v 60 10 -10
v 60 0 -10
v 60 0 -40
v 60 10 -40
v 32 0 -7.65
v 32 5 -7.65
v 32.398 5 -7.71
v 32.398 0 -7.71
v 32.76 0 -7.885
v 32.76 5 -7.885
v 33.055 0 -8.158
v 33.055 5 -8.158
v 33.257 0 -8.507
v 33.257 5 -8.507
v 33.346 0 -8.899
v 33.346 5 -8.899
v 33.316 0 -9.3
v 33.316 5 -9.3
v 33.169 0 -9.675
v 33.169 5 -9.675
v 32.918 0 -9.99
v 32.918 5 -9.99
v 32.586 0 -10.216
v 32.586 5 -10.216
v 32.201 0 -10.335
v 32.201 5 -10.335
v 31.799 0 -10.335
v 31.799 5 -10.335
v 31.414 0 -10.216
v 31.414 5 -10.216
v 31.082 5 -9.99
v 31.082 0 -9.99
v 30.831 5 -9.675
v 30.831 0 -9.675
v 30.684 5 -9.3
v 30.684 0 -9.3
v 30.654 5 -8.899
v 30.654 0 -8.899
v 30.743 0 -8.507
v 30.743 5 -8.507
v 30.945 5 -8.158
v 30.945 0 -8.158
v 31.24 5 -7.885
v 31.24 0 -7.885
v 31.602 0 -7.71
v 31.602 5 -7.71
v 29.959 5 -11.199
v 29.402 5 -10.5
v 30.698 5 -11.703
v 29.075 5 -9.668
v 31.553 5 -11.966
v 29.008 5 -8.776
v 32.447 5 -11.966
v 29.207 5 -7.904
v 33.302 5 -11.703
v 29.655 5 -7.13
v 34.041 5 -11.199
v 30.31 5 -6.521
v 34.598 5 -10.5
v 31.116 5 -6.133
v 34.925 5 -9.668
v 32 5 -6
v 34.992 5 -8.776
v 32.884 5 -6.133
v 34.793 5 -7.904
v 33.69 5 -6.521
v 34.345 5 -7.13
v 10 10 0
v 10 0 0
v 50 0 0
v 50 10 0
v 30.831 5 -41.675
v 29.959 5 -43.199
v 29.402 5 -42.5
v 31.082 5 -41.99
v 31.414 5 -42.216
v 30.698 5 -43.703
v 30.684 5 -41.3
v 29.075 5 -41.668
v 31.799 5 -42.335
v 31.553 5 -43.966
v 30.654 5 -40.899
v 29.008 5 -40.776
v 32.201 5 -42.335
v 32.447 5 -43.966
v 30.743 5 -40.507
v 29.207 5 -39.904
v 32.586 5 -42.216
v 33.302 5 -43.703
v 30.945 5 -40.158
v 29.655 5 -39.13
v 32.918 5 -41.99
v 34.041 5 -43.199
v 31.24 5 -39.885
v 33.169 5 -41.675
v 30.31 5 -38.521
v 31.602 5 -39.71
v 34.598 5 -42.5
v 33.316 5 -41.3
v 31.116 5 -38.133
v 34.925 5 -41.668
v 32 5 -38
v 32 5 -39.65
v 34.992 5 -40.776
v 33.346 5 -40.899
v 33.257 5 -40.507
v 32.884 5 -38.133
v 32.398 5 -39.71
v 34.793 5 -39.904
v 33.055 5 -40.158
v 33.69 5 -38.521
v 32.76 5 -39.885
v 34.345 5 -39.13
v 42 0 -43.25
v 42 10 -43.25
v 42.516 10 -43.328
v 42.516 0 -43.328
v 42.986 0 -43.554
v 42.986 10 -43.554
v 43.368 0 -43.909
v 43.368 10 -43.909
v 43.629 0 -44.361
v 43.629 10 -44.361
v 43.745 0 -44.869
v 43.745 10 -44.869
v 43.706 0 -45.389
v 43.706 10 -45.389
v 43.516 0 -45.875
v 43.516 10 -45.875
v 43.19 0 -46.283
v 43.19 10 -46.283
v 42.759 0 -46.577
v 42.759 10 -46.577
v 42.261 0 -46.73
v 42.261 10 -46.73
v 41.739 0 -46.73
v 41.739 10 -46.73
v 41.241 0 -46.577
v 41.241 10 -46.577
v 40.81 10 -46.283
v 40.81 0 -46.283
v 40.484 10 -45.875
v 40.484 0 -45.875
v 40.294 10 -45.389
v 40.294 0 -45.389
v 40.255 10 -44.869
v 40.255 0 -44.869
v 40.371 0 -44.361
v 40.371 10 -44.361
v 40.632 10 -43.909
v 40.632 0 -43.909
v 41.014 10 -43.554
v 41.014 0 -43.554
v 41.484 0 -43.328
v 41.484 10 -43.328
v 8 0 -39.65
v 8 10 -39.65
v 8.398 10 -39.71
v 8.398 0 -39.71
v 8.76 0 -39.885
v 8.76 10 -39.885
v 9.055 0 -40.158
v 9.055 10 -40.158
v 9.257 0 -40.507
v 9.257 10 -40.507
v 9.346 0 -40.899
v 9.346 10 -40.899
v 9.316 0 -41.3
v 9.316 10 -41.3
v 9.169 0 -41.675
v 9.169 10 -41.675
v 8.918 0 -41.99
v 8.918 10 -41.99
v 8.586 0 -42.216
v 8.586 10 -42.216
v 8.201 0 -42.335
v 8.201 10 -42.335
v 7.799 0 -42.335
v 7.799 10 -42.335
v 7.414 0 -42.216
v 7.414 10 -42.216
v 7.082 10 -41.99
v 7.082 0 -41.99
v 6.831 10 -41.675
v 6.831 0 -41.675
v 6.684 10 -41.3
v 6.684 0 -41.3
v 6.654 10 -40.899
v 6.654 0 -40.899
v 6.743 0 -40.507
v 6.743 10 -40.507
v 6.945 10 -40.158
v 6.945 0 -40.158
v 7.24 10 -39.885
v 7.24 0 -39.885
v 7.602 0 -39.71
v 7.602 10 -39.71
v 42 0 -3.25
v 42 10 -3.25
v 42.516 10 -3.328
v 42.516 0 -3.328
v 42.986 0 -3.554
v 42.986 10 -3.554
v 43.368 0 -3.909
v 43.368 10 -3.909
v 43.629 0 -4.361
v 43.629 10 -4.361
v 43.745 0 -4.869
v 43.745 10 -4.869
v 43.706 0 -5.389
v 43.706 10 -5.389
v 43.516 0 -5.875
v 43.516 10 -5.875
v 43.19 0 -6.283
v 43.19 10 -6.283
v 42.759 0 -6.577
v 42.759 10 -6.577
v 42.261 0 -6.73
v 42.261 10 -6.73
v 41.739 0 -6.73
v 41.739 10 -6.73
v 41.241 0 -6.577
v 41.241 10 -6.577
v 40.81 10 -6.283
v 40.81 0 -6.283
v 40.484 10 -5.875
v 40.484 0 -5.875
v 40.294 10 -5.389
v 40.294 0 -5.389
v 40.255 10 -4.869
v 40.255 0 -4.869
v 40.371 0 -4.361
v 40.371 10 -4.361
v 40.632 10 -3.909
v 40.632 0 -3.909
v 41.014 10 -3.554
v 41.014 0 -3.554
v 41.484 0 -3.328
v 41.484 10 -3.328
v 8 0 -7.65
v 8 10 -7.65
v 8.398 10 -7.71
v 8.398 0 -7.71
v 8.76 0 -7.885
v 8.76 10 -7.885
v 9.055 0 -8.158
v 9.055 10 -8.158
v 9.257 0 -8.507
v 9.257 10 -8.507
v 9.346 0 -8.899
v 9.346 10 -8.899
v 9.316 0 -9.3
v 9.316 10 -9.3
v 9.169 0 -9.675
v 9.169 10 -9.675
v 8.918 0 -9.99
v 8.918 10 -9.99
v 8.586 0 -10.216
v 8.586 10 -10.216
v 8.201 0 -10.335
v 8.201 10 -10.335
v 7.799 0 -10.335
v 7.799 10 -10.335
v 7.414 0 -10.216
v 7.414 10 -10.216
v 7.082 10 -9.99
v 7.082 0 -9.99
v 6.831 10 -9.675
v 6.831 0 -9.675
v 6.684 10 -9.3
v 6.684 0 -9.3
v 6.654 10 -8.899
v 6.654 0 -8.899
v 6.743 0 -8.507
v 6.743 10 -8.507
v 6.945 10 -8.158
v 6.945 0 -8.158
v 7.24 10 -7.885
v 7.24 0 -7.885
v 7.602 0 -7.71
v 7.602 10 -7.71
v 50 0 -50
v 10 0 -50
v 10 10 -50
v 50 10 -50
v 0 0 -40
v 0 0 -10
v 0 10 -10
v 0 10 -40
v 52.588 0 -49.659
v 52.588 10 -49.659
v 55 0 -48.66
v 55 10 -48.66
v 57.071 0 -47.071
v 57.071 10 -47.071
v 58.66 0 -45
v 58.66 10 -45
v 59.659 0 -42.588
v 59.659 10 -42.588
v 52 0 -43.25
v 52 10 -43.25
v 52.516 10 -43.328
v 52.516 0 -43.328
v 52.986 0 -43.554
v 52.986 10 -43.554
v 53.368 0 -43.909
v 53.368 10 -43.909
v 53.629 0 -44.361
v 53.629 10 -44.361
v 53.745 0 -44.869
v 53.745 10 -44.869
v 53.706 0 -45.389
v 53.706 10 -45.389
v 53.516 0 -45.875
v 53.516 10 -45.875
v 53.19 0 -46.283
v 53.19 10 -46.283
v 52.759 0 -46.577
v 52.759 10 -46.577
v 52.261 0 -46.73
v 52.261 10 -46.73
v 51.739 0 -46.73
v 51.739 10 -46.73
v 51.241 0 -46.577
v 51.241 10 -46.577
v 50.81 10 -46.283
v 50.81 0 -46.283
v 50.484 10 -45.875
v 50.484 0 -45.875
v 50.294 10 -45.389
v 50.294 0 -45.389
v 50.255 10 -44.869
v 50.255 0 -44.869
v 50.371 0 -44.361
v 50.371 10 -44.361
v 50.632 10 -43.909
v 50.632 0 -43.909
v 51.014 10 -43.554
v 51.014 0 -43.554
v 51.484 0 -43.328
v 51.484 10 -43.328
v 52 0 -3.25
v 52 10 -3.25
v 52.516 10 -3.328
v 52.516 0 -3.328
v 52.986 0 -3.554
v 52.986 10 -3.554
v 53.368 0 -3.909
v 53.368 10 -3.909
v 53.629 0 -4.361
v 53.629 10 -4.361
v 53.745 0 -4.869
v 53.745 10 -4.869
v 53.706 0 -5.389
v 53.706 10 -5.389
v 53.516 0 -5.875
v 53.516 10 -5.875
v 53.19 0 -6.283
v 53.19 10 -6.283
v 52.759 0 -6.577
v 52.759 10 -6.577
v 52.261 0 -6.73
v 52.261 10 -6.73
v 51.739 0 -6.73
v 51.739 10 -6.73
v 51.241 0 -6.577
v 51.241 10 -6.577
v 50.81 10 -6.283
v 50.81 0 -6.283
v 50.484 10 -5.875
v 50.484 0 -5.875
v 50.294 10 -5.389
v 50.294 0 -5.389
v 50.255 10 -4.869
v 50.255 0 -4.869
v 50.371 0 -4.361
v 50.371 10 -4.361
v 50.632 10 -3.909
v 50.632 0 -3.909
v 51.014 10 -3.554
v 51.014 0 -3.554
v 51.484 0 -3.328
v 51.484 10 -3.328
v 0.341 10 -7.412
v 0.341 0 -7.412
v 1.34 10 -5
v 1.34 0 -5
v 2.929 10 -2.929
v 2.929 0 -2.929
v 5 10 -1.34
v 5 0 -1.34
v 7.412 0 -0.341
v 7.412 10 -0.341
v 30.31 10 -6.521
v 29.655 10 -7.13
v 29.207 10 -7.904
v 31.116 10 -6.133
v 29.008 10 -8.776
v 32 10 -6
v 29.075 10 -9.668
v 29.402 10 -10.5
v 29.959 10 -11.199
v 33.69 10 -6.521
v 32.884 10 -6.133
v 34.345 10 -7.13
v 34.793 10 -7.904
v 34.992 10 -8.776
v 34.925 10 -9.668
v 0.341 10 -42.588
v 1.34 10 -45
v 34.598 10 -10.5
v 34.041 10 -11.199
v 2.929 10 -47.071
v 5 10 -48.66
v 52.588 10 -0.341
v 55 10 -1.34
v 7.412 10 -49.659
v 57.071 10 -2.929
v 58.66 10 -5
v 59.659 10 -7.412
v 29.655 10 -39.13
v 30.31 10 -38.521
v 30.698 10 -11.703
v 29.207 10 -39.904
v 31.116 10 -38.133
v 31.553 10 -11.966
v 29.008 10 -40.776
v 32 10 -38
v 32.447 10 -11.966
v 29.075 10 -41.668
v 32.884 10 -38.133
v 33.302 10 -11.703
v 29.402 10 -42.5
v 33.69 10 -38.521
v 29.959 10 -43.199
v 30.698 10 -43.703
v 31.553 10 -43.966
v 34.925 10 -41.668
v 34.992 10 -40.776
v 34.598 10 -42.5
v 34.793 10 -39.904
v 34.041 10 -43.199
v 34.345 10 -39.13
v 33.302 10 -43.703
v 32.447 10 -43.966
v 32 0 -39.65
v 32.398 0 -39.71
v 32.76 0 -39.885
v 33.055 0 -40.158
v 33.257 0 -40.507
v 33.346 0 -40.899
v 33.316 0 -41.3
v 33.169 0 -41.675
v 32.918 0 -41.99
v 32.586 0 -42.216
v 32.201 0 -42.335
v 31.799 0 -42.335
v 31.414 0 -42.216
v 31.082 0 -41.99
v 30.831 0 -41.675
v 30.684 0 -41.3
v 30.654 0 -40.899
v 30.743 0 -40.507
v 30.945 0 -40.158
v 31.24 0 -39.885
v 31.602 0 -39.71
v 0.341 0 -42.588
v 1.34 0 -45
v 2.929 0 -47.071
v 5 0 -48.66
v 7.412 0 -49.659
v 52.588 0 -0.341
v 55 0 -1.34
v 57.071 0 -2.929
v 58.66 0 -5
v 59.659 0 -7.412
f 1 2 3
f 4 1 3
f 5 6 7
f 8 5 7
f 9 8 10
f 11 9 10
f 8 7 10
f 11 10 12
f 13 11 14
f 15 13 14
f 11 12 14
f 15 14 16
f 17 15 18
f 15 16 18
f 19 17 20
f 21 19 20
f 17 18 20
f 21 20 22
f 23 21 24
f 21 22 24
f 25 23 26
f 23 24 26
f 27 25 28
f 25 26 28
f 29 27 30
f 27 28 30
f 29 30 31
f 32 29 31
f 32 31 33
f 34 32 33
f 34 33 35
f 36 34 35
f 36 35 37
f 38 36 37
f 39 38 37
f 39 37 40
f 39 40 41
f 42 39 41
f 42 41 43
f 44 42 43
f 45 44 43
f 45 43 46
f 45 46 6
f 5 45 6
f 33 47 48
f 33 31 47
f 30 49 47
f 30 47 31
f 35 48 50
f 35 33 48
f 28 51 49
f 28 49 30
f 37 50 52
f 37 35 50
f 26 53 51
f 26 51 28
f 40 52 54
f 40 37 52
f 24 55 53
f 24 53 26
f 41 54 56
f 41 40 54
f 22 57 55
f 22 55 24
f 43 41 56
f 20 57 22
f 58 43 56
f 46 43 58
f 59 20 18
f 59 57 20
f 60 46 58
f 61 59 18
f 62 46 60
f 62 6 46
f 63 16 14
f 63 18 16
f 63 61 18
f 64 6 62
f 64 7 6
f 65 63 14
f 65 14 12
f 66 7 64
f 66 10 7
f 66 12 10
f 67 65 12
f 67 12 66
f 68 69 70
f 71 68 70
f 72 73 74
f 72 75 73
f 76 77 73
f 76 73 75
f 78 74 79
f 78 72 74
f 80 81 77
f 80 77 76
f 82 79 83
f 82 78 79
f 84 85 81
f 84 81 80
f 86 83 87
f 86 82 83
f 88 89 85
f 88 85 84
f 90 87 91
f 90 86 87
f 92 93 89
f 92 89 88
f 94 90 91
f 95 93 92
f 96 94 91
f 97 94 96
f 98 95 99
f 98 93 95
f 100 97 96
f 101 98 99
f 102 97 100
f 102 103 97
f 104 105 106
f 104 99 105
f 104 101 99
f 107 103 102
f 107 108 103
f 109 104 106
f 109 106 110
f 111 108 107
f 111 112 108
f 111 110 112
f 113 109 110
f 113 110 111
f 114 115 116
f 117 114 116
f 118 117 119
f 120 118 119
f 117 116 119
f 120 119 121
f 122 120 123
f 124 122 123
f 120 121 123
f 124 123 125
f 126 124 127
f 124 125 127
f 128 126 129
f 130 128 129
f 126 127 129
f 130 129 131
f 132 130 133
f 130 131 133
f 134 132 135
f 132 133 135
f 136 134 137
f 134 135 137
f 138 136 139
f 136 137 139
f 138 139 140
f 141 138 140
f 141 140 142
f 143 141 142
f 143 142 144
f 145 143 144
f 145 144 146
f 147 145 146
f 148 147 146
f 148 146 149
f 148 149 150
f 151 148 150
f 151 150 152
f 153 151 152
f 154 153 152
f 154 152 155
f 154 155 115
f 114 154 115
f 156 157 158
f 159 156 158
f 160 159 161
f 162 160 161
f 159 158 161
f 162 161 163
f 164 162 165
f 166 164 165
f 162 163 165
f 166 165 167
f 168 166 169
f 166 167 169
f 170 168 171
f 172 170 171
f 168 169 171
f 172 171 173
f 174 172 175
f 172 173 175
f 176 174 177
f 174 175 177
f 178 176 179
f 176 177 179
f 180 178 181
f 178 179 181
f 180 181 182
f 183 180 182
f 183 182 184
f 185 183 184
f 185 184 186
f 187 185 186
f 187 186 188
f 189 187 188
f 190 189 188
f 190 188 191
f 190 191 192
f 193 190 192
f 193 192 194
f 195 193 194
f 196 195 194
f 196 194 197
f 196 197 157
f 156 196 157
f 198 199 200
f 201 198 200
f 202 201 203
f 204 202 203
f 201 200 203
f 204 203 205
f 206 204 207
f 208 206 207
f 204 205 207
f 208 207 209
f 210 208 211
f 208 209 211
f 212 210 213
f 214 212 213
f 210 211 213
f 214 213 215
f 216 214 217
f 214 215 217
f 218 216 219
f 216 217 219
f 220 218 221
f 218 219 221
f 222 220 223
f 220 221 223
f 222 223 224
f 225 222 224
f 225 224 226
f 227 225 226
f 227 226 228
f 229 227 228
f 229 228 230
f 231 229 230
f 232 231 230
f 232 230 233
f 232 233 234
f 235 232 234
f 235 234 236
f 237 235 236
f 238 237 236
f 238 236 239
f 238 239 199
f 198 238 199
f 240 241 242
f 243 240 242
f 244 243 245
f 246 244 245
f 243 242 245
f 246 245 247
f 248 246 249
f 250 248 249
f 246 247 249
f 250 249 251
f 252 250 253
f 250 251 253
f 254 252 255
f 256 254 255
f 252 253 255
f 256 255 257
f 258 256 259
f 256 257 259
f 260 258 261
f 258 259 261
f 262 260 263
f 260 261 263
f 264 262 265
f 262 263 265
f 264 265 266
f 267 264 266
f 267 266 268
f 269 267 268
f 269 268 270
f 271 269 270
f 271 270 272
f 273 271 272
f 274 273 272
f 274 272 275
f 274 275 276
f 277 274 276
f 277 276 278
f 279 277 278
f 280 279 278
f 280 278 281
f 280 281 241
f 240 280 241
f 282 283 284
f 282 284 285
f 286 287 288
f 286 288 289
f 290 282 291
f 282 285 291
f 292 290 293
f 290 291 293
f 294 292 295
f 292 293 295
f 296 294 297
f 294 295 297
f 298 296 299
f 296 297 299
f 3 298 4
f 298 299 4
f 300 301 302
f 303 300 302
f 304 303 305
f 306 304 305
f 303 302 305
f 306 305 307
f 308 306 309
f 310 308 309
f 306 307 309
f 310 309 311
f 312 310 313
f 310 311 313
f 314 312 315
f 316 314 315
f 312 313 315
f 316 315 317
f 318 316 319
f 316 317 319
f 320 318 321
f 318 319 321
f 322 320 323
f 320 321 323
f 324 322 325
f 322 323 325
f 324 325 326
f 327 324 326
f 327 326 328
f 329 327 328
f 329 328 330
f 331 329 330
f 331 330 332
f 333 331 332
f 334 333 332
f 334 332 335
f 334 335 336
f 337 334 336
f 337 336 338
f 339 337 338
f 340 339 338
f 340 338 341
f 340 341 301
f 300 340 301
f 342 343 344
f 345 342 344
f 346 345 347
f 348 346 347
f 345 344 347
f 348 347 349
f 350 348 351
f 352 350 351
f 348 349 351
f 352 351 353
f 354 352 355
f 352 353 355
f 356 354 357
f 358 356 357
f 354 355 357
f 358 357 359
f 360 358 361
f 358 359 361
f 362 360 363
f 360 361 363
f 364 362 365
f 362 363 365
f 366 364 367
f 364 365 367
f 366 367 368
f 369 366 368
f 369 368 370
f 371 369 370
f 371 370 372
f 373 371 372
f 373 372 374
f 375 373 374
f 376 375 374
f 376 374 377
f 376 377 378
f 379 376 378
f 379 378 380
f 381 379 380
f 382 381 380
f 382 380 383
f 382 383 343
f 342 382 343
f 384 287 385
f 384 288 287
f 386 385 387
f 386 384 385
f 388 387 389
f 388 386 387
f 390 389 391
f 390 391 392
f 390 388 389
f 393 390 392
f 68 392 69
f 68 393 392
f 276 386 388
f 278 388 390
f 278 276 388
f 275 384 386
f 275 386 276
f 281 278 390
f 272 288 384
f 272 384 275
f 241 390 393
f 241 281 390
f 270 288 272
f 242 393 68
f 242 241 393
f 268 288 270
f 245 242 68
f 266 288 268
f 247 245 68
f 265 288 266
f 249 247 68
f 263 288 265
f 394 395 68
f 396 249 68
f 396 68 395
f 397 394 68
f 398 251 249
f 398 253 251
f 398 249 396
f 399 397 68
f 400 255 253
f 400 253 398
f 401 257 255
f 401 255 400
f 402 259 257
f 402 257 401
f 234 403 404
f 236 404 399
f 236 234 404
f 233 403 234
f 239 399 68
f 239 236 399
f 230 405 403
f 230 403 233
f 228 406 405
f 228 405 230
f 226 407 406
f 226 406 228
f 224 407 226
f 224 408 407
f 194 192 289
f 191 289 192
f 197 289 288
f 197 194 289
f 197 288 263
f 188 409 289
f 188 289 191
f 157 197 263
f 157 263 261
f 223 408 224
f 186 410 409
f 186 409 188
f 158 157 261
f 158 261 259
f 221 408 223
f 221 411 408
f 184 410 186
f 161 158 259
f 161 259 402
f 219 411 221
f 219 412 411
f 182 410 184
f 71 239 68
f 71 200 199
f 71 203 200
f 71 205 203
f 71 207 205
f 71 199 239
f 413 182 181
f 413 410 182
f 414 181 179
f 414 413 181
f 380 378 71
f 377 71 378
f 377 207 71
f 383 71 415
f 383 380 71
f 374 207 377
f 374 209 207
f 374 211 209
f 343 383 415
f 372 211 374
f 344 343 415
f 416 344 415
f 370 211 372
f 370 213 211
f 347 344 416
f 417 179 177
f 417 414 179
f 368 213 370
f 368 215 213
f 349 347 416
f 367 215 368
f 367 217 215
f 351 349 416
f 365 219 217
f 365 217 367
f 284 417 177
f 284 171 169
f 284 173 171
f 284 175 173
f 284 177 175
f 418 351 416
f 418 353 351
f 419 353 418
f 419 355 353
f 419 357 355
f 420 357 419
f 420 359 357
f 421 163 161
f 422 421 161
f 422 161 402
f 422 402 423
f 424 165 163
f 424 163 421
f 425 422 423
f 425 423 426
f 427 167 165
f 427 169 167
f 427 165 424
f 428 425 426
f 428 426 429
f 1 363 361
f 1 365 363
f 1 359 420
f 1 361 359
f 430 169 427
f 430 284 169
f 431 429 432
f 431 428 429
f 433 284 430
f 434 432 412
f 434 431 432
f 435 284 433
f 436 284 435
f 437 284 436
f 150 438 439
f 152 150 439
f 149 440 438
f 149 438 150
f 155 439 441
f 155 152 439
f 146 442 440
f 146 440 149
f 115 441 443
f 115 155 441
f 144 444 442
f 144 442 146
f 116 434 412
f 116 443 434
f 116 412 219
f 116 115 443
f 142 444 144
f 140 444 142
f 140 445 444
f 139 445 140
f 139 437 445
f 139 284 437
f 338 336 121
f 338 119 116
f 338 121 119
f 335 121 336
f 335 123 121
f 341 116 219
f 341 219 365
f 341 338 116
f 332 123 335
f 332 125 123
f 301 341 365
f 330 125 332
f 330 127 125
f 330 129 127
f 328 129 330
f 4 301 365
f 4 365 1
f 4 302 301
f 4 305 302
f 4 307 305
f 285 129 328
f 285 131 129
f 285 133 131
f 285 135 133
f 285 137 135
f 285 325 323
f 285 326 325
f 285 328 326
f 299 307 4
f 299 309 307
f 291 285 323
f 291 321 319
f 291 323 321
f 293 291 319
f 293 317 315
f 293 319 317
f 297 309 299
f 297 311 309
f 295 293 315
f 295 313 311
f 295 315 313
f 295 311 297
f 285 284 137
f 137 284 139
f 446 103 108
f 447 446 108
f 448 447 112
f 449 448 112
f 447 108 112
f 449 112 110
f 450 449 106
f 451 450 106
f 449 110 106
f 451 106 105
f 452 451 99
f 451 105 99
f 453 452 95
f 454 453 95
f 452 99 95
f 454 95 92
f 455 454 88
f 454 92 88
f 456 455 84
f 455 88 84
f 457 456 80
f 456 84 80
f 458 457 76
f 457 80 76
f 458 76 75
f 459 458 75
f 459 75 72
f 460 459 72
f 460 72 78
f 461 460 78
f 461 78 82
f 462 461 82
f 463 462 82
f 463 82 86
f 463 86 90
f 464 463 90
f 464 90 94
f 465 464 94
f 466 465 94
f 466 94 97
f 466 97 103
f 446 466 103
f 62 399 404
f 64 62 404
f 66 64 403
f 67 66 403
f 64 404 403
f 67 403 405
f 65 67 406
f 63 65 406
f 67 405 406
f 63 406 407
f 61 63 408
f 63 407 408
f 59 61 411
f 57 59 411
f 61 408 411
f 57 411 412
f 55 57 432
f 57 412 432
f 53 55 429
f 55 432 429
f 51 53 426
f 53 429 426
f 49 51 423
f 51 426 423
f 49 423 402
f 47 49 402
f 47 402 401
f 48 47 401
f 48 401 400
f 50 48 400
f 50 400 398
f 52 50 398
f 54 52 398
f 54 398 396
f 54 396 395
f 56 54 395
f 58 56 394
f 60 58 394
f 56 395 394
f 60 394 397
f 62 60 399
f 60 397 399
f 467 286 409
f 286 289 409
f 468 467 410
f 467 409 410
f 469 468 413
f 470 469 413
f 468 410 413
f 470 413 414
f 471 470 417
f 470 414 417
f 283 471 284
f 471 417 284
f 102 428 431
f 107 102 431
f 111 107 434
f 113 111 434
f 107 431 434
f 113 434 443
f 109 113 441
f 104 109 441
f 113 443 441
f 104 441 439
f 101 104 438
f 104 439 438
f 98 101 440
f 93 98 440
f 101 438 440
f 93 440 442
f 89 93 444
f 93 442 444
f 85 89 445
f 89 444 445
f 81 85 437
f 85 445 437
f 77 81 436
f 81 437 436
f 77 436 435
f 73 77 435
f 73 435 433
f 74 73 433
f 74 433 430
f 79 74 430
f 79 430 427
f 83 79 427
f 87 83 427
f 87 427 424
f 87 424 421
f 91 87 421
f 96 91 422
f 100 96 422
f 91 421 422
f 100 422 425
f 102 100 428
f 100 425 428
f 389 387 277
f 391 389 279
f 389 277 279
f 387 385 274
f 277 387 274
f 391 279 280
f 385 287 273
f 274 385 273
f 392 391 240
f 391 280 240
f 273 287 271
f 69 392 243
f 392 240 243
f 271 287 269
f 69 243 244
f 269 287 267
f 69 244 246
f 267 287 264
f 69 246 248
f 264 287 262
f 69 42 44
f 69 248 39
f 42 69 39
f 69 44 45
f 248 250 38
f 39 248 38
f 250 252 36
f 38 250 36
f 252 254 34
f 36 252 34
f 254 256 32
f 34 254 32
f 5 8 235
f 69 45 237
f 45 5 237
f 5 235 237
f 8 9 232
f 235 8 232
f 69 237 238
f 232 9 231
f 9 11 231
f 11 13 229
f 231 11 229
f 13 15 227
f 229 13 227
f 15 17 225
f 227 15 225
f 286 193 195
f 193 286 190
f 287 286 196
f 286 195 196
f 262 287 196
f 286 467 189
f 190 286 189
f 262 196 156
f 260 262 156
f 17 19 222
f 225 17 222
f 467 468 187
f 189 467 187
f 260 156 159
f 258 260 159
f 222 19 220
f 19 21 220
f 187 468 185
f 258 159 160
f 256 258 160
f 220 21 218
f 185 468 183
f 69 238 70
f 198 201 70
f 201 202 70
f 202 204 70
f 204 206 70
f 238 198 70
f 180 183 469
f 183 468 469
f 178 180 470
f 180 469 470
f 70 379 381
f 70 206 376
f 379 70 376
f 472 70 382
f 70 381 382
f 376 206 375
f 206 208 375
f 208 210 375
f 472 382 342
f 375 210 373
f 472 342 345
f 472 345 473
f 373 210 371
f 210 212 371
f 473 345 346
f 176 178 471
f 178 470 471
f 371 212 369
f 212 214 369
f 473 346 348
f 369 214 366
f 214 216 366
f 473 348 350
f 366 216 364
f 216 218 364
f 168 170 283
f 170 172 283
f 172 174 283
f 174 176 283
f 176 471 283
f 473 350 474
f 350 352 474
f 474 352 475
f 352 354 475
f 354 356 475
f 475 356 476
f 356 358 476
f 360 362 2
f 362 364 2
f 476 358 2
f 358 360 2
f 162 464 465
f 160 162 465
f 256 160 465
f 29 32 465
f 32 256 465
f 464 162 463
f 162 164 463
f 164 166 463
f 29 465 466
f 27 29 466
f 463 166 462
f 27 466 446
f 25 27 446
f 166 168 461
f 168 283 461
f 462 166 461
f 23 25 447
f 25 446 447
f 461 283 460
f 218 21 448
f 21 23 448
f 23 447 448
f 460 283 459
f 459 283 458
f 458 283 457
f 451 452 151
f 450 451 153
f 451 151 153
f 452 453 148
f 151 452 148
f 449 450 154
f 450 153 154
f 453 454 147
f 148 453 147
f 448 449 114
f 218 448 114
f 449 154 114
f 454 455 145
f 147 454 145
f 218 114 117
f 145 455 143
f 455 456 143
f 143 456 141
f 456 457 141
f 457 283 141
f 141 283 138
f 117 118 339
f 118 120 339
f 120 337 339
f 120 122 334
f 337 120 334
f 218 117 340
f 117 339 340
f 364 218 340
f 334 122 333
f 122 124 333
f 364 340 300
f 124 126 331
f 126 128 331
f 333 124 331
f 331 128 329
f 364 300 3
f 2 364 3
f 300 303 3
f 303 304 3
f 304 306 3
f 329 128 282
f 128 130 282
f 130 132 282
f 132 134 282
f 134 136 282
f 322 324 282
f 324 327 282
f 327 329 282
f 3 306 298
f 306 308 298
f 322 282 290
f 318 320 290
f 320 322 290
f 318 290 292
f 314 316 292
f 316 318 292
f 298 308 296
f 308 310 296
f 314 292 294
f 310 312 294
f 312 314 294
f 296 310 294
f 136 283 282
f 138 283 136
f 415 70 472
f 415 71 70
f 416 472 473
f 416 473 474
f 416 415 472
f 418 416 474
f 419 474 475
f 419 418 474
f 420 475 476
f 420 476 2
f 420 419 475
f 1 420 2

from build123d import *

# Parameters (mm, degrees)
SKETCH1_W           = 60
SKETCH1_H           = 50
BOSS_EXTRUDE1_DEPTH = 10
SKETCH2_R           = 1.35
CUT_EXTRUDE1_DEPTH  = 79.74007874
SKETCH3_R           = 1.75
CUT_EXTRUDE2_DEPTH  = 79.74007874
FILLET1_R           = 10
SKETCH4_R           = 3
CUT_EXTRUDE3_DEPTH  = 5


with BuildPart() as part:
    # Sketch1 → Boss-Extrude1 (new body)
    with BuildSketch(Plane(origin=(0, 0, 0), x_dir=(1, 0, 0), z_dir=(0, 1, 0))):
        with Locations((30, 25)):
            Rectangle(SKETCH1_W, SKETCH1_H)
    extrude(amount=BOSS_EXTRUDE1_DEPTH)

    # Sketch2 → Cut-Extrude1 (cut, through all)
    with BuildSketch(Plane(origin=(0, 10, 0), x_dir=(1, 0, 0), z_dir=(0, 1, 0))):
        with Locations(Location((8, 41, 0), (0, 0, 270))):
            Circle(SKETCH2_R)
        with Locations(Location((8, 9, 0), (0, 0, 270))):
            Circle(SKETCH2_R)
        with Locations(Location((32, 9, 0), (0, 0, 270))):
            Circle(SKETCH2_R)
        with Locations(Location((32, 41, 0), (0, 0, 270))):
            Circle(SKETCH2_R)
    extrude(amount=-CUT_EXTRUDE1_DEPTH, mode=Mode.SUBTRACT)

    # Sketch3 → Cut-Extrude2 (cut, through all)
    with BuildSketch(Plane(origin=(0, 10, 0), x_dir=(1, 0, 0), z_dir=(0, 1, 0))):
        with Locations(Location((42, 45, 0), (0, 0, 270))):
            Circle(SKETCH3_R)
        with Locations(Location((52, 45, 0), (0, 0, 270))):
            Circle(SKETCH3_R)
        with Locations(Location((52, 5, 0), (0, 0, 270))):
            Circle(SKETCH3_R)
        with Locations(Location((42, 5, 0), (0, 0, 270))):
            Circle(SKETCH3_R)
    extrude(amount=-CUT_EXTRUDE2_DEPTH, mode=Mode.SUBTRACT)

    # Fillet1
    fillet1_edges = [part.edges().sort_by_distance(p)[0] for p in [
        (0, 5, -50),
        (60, 5, -50),
        (60, 5, 0),
        (0, 5, 0),
    ]]
    fillet(fillet1_edges, radius=FILLET1_R)

    # Sketch4 → Cut-Extrude3 (cut)
    with BuildSketch(Plane(origin=(0, 10, 0), x_dir=(1, 0, 0), z_dir=(0, 1, 0))):
        with Locations(Location((32, 41, 0), (0, 0, 270))):
            Circle(SKETCH4_R)
        with Locations(Location((32, 9, 0), (0, 0, 270))):
            Circle(SKETCH4_R)
    extrude(amount=-CUT_EXTRUDE3_DEPTH, mode=Mode.SUBTRACT)


solid = part.part
